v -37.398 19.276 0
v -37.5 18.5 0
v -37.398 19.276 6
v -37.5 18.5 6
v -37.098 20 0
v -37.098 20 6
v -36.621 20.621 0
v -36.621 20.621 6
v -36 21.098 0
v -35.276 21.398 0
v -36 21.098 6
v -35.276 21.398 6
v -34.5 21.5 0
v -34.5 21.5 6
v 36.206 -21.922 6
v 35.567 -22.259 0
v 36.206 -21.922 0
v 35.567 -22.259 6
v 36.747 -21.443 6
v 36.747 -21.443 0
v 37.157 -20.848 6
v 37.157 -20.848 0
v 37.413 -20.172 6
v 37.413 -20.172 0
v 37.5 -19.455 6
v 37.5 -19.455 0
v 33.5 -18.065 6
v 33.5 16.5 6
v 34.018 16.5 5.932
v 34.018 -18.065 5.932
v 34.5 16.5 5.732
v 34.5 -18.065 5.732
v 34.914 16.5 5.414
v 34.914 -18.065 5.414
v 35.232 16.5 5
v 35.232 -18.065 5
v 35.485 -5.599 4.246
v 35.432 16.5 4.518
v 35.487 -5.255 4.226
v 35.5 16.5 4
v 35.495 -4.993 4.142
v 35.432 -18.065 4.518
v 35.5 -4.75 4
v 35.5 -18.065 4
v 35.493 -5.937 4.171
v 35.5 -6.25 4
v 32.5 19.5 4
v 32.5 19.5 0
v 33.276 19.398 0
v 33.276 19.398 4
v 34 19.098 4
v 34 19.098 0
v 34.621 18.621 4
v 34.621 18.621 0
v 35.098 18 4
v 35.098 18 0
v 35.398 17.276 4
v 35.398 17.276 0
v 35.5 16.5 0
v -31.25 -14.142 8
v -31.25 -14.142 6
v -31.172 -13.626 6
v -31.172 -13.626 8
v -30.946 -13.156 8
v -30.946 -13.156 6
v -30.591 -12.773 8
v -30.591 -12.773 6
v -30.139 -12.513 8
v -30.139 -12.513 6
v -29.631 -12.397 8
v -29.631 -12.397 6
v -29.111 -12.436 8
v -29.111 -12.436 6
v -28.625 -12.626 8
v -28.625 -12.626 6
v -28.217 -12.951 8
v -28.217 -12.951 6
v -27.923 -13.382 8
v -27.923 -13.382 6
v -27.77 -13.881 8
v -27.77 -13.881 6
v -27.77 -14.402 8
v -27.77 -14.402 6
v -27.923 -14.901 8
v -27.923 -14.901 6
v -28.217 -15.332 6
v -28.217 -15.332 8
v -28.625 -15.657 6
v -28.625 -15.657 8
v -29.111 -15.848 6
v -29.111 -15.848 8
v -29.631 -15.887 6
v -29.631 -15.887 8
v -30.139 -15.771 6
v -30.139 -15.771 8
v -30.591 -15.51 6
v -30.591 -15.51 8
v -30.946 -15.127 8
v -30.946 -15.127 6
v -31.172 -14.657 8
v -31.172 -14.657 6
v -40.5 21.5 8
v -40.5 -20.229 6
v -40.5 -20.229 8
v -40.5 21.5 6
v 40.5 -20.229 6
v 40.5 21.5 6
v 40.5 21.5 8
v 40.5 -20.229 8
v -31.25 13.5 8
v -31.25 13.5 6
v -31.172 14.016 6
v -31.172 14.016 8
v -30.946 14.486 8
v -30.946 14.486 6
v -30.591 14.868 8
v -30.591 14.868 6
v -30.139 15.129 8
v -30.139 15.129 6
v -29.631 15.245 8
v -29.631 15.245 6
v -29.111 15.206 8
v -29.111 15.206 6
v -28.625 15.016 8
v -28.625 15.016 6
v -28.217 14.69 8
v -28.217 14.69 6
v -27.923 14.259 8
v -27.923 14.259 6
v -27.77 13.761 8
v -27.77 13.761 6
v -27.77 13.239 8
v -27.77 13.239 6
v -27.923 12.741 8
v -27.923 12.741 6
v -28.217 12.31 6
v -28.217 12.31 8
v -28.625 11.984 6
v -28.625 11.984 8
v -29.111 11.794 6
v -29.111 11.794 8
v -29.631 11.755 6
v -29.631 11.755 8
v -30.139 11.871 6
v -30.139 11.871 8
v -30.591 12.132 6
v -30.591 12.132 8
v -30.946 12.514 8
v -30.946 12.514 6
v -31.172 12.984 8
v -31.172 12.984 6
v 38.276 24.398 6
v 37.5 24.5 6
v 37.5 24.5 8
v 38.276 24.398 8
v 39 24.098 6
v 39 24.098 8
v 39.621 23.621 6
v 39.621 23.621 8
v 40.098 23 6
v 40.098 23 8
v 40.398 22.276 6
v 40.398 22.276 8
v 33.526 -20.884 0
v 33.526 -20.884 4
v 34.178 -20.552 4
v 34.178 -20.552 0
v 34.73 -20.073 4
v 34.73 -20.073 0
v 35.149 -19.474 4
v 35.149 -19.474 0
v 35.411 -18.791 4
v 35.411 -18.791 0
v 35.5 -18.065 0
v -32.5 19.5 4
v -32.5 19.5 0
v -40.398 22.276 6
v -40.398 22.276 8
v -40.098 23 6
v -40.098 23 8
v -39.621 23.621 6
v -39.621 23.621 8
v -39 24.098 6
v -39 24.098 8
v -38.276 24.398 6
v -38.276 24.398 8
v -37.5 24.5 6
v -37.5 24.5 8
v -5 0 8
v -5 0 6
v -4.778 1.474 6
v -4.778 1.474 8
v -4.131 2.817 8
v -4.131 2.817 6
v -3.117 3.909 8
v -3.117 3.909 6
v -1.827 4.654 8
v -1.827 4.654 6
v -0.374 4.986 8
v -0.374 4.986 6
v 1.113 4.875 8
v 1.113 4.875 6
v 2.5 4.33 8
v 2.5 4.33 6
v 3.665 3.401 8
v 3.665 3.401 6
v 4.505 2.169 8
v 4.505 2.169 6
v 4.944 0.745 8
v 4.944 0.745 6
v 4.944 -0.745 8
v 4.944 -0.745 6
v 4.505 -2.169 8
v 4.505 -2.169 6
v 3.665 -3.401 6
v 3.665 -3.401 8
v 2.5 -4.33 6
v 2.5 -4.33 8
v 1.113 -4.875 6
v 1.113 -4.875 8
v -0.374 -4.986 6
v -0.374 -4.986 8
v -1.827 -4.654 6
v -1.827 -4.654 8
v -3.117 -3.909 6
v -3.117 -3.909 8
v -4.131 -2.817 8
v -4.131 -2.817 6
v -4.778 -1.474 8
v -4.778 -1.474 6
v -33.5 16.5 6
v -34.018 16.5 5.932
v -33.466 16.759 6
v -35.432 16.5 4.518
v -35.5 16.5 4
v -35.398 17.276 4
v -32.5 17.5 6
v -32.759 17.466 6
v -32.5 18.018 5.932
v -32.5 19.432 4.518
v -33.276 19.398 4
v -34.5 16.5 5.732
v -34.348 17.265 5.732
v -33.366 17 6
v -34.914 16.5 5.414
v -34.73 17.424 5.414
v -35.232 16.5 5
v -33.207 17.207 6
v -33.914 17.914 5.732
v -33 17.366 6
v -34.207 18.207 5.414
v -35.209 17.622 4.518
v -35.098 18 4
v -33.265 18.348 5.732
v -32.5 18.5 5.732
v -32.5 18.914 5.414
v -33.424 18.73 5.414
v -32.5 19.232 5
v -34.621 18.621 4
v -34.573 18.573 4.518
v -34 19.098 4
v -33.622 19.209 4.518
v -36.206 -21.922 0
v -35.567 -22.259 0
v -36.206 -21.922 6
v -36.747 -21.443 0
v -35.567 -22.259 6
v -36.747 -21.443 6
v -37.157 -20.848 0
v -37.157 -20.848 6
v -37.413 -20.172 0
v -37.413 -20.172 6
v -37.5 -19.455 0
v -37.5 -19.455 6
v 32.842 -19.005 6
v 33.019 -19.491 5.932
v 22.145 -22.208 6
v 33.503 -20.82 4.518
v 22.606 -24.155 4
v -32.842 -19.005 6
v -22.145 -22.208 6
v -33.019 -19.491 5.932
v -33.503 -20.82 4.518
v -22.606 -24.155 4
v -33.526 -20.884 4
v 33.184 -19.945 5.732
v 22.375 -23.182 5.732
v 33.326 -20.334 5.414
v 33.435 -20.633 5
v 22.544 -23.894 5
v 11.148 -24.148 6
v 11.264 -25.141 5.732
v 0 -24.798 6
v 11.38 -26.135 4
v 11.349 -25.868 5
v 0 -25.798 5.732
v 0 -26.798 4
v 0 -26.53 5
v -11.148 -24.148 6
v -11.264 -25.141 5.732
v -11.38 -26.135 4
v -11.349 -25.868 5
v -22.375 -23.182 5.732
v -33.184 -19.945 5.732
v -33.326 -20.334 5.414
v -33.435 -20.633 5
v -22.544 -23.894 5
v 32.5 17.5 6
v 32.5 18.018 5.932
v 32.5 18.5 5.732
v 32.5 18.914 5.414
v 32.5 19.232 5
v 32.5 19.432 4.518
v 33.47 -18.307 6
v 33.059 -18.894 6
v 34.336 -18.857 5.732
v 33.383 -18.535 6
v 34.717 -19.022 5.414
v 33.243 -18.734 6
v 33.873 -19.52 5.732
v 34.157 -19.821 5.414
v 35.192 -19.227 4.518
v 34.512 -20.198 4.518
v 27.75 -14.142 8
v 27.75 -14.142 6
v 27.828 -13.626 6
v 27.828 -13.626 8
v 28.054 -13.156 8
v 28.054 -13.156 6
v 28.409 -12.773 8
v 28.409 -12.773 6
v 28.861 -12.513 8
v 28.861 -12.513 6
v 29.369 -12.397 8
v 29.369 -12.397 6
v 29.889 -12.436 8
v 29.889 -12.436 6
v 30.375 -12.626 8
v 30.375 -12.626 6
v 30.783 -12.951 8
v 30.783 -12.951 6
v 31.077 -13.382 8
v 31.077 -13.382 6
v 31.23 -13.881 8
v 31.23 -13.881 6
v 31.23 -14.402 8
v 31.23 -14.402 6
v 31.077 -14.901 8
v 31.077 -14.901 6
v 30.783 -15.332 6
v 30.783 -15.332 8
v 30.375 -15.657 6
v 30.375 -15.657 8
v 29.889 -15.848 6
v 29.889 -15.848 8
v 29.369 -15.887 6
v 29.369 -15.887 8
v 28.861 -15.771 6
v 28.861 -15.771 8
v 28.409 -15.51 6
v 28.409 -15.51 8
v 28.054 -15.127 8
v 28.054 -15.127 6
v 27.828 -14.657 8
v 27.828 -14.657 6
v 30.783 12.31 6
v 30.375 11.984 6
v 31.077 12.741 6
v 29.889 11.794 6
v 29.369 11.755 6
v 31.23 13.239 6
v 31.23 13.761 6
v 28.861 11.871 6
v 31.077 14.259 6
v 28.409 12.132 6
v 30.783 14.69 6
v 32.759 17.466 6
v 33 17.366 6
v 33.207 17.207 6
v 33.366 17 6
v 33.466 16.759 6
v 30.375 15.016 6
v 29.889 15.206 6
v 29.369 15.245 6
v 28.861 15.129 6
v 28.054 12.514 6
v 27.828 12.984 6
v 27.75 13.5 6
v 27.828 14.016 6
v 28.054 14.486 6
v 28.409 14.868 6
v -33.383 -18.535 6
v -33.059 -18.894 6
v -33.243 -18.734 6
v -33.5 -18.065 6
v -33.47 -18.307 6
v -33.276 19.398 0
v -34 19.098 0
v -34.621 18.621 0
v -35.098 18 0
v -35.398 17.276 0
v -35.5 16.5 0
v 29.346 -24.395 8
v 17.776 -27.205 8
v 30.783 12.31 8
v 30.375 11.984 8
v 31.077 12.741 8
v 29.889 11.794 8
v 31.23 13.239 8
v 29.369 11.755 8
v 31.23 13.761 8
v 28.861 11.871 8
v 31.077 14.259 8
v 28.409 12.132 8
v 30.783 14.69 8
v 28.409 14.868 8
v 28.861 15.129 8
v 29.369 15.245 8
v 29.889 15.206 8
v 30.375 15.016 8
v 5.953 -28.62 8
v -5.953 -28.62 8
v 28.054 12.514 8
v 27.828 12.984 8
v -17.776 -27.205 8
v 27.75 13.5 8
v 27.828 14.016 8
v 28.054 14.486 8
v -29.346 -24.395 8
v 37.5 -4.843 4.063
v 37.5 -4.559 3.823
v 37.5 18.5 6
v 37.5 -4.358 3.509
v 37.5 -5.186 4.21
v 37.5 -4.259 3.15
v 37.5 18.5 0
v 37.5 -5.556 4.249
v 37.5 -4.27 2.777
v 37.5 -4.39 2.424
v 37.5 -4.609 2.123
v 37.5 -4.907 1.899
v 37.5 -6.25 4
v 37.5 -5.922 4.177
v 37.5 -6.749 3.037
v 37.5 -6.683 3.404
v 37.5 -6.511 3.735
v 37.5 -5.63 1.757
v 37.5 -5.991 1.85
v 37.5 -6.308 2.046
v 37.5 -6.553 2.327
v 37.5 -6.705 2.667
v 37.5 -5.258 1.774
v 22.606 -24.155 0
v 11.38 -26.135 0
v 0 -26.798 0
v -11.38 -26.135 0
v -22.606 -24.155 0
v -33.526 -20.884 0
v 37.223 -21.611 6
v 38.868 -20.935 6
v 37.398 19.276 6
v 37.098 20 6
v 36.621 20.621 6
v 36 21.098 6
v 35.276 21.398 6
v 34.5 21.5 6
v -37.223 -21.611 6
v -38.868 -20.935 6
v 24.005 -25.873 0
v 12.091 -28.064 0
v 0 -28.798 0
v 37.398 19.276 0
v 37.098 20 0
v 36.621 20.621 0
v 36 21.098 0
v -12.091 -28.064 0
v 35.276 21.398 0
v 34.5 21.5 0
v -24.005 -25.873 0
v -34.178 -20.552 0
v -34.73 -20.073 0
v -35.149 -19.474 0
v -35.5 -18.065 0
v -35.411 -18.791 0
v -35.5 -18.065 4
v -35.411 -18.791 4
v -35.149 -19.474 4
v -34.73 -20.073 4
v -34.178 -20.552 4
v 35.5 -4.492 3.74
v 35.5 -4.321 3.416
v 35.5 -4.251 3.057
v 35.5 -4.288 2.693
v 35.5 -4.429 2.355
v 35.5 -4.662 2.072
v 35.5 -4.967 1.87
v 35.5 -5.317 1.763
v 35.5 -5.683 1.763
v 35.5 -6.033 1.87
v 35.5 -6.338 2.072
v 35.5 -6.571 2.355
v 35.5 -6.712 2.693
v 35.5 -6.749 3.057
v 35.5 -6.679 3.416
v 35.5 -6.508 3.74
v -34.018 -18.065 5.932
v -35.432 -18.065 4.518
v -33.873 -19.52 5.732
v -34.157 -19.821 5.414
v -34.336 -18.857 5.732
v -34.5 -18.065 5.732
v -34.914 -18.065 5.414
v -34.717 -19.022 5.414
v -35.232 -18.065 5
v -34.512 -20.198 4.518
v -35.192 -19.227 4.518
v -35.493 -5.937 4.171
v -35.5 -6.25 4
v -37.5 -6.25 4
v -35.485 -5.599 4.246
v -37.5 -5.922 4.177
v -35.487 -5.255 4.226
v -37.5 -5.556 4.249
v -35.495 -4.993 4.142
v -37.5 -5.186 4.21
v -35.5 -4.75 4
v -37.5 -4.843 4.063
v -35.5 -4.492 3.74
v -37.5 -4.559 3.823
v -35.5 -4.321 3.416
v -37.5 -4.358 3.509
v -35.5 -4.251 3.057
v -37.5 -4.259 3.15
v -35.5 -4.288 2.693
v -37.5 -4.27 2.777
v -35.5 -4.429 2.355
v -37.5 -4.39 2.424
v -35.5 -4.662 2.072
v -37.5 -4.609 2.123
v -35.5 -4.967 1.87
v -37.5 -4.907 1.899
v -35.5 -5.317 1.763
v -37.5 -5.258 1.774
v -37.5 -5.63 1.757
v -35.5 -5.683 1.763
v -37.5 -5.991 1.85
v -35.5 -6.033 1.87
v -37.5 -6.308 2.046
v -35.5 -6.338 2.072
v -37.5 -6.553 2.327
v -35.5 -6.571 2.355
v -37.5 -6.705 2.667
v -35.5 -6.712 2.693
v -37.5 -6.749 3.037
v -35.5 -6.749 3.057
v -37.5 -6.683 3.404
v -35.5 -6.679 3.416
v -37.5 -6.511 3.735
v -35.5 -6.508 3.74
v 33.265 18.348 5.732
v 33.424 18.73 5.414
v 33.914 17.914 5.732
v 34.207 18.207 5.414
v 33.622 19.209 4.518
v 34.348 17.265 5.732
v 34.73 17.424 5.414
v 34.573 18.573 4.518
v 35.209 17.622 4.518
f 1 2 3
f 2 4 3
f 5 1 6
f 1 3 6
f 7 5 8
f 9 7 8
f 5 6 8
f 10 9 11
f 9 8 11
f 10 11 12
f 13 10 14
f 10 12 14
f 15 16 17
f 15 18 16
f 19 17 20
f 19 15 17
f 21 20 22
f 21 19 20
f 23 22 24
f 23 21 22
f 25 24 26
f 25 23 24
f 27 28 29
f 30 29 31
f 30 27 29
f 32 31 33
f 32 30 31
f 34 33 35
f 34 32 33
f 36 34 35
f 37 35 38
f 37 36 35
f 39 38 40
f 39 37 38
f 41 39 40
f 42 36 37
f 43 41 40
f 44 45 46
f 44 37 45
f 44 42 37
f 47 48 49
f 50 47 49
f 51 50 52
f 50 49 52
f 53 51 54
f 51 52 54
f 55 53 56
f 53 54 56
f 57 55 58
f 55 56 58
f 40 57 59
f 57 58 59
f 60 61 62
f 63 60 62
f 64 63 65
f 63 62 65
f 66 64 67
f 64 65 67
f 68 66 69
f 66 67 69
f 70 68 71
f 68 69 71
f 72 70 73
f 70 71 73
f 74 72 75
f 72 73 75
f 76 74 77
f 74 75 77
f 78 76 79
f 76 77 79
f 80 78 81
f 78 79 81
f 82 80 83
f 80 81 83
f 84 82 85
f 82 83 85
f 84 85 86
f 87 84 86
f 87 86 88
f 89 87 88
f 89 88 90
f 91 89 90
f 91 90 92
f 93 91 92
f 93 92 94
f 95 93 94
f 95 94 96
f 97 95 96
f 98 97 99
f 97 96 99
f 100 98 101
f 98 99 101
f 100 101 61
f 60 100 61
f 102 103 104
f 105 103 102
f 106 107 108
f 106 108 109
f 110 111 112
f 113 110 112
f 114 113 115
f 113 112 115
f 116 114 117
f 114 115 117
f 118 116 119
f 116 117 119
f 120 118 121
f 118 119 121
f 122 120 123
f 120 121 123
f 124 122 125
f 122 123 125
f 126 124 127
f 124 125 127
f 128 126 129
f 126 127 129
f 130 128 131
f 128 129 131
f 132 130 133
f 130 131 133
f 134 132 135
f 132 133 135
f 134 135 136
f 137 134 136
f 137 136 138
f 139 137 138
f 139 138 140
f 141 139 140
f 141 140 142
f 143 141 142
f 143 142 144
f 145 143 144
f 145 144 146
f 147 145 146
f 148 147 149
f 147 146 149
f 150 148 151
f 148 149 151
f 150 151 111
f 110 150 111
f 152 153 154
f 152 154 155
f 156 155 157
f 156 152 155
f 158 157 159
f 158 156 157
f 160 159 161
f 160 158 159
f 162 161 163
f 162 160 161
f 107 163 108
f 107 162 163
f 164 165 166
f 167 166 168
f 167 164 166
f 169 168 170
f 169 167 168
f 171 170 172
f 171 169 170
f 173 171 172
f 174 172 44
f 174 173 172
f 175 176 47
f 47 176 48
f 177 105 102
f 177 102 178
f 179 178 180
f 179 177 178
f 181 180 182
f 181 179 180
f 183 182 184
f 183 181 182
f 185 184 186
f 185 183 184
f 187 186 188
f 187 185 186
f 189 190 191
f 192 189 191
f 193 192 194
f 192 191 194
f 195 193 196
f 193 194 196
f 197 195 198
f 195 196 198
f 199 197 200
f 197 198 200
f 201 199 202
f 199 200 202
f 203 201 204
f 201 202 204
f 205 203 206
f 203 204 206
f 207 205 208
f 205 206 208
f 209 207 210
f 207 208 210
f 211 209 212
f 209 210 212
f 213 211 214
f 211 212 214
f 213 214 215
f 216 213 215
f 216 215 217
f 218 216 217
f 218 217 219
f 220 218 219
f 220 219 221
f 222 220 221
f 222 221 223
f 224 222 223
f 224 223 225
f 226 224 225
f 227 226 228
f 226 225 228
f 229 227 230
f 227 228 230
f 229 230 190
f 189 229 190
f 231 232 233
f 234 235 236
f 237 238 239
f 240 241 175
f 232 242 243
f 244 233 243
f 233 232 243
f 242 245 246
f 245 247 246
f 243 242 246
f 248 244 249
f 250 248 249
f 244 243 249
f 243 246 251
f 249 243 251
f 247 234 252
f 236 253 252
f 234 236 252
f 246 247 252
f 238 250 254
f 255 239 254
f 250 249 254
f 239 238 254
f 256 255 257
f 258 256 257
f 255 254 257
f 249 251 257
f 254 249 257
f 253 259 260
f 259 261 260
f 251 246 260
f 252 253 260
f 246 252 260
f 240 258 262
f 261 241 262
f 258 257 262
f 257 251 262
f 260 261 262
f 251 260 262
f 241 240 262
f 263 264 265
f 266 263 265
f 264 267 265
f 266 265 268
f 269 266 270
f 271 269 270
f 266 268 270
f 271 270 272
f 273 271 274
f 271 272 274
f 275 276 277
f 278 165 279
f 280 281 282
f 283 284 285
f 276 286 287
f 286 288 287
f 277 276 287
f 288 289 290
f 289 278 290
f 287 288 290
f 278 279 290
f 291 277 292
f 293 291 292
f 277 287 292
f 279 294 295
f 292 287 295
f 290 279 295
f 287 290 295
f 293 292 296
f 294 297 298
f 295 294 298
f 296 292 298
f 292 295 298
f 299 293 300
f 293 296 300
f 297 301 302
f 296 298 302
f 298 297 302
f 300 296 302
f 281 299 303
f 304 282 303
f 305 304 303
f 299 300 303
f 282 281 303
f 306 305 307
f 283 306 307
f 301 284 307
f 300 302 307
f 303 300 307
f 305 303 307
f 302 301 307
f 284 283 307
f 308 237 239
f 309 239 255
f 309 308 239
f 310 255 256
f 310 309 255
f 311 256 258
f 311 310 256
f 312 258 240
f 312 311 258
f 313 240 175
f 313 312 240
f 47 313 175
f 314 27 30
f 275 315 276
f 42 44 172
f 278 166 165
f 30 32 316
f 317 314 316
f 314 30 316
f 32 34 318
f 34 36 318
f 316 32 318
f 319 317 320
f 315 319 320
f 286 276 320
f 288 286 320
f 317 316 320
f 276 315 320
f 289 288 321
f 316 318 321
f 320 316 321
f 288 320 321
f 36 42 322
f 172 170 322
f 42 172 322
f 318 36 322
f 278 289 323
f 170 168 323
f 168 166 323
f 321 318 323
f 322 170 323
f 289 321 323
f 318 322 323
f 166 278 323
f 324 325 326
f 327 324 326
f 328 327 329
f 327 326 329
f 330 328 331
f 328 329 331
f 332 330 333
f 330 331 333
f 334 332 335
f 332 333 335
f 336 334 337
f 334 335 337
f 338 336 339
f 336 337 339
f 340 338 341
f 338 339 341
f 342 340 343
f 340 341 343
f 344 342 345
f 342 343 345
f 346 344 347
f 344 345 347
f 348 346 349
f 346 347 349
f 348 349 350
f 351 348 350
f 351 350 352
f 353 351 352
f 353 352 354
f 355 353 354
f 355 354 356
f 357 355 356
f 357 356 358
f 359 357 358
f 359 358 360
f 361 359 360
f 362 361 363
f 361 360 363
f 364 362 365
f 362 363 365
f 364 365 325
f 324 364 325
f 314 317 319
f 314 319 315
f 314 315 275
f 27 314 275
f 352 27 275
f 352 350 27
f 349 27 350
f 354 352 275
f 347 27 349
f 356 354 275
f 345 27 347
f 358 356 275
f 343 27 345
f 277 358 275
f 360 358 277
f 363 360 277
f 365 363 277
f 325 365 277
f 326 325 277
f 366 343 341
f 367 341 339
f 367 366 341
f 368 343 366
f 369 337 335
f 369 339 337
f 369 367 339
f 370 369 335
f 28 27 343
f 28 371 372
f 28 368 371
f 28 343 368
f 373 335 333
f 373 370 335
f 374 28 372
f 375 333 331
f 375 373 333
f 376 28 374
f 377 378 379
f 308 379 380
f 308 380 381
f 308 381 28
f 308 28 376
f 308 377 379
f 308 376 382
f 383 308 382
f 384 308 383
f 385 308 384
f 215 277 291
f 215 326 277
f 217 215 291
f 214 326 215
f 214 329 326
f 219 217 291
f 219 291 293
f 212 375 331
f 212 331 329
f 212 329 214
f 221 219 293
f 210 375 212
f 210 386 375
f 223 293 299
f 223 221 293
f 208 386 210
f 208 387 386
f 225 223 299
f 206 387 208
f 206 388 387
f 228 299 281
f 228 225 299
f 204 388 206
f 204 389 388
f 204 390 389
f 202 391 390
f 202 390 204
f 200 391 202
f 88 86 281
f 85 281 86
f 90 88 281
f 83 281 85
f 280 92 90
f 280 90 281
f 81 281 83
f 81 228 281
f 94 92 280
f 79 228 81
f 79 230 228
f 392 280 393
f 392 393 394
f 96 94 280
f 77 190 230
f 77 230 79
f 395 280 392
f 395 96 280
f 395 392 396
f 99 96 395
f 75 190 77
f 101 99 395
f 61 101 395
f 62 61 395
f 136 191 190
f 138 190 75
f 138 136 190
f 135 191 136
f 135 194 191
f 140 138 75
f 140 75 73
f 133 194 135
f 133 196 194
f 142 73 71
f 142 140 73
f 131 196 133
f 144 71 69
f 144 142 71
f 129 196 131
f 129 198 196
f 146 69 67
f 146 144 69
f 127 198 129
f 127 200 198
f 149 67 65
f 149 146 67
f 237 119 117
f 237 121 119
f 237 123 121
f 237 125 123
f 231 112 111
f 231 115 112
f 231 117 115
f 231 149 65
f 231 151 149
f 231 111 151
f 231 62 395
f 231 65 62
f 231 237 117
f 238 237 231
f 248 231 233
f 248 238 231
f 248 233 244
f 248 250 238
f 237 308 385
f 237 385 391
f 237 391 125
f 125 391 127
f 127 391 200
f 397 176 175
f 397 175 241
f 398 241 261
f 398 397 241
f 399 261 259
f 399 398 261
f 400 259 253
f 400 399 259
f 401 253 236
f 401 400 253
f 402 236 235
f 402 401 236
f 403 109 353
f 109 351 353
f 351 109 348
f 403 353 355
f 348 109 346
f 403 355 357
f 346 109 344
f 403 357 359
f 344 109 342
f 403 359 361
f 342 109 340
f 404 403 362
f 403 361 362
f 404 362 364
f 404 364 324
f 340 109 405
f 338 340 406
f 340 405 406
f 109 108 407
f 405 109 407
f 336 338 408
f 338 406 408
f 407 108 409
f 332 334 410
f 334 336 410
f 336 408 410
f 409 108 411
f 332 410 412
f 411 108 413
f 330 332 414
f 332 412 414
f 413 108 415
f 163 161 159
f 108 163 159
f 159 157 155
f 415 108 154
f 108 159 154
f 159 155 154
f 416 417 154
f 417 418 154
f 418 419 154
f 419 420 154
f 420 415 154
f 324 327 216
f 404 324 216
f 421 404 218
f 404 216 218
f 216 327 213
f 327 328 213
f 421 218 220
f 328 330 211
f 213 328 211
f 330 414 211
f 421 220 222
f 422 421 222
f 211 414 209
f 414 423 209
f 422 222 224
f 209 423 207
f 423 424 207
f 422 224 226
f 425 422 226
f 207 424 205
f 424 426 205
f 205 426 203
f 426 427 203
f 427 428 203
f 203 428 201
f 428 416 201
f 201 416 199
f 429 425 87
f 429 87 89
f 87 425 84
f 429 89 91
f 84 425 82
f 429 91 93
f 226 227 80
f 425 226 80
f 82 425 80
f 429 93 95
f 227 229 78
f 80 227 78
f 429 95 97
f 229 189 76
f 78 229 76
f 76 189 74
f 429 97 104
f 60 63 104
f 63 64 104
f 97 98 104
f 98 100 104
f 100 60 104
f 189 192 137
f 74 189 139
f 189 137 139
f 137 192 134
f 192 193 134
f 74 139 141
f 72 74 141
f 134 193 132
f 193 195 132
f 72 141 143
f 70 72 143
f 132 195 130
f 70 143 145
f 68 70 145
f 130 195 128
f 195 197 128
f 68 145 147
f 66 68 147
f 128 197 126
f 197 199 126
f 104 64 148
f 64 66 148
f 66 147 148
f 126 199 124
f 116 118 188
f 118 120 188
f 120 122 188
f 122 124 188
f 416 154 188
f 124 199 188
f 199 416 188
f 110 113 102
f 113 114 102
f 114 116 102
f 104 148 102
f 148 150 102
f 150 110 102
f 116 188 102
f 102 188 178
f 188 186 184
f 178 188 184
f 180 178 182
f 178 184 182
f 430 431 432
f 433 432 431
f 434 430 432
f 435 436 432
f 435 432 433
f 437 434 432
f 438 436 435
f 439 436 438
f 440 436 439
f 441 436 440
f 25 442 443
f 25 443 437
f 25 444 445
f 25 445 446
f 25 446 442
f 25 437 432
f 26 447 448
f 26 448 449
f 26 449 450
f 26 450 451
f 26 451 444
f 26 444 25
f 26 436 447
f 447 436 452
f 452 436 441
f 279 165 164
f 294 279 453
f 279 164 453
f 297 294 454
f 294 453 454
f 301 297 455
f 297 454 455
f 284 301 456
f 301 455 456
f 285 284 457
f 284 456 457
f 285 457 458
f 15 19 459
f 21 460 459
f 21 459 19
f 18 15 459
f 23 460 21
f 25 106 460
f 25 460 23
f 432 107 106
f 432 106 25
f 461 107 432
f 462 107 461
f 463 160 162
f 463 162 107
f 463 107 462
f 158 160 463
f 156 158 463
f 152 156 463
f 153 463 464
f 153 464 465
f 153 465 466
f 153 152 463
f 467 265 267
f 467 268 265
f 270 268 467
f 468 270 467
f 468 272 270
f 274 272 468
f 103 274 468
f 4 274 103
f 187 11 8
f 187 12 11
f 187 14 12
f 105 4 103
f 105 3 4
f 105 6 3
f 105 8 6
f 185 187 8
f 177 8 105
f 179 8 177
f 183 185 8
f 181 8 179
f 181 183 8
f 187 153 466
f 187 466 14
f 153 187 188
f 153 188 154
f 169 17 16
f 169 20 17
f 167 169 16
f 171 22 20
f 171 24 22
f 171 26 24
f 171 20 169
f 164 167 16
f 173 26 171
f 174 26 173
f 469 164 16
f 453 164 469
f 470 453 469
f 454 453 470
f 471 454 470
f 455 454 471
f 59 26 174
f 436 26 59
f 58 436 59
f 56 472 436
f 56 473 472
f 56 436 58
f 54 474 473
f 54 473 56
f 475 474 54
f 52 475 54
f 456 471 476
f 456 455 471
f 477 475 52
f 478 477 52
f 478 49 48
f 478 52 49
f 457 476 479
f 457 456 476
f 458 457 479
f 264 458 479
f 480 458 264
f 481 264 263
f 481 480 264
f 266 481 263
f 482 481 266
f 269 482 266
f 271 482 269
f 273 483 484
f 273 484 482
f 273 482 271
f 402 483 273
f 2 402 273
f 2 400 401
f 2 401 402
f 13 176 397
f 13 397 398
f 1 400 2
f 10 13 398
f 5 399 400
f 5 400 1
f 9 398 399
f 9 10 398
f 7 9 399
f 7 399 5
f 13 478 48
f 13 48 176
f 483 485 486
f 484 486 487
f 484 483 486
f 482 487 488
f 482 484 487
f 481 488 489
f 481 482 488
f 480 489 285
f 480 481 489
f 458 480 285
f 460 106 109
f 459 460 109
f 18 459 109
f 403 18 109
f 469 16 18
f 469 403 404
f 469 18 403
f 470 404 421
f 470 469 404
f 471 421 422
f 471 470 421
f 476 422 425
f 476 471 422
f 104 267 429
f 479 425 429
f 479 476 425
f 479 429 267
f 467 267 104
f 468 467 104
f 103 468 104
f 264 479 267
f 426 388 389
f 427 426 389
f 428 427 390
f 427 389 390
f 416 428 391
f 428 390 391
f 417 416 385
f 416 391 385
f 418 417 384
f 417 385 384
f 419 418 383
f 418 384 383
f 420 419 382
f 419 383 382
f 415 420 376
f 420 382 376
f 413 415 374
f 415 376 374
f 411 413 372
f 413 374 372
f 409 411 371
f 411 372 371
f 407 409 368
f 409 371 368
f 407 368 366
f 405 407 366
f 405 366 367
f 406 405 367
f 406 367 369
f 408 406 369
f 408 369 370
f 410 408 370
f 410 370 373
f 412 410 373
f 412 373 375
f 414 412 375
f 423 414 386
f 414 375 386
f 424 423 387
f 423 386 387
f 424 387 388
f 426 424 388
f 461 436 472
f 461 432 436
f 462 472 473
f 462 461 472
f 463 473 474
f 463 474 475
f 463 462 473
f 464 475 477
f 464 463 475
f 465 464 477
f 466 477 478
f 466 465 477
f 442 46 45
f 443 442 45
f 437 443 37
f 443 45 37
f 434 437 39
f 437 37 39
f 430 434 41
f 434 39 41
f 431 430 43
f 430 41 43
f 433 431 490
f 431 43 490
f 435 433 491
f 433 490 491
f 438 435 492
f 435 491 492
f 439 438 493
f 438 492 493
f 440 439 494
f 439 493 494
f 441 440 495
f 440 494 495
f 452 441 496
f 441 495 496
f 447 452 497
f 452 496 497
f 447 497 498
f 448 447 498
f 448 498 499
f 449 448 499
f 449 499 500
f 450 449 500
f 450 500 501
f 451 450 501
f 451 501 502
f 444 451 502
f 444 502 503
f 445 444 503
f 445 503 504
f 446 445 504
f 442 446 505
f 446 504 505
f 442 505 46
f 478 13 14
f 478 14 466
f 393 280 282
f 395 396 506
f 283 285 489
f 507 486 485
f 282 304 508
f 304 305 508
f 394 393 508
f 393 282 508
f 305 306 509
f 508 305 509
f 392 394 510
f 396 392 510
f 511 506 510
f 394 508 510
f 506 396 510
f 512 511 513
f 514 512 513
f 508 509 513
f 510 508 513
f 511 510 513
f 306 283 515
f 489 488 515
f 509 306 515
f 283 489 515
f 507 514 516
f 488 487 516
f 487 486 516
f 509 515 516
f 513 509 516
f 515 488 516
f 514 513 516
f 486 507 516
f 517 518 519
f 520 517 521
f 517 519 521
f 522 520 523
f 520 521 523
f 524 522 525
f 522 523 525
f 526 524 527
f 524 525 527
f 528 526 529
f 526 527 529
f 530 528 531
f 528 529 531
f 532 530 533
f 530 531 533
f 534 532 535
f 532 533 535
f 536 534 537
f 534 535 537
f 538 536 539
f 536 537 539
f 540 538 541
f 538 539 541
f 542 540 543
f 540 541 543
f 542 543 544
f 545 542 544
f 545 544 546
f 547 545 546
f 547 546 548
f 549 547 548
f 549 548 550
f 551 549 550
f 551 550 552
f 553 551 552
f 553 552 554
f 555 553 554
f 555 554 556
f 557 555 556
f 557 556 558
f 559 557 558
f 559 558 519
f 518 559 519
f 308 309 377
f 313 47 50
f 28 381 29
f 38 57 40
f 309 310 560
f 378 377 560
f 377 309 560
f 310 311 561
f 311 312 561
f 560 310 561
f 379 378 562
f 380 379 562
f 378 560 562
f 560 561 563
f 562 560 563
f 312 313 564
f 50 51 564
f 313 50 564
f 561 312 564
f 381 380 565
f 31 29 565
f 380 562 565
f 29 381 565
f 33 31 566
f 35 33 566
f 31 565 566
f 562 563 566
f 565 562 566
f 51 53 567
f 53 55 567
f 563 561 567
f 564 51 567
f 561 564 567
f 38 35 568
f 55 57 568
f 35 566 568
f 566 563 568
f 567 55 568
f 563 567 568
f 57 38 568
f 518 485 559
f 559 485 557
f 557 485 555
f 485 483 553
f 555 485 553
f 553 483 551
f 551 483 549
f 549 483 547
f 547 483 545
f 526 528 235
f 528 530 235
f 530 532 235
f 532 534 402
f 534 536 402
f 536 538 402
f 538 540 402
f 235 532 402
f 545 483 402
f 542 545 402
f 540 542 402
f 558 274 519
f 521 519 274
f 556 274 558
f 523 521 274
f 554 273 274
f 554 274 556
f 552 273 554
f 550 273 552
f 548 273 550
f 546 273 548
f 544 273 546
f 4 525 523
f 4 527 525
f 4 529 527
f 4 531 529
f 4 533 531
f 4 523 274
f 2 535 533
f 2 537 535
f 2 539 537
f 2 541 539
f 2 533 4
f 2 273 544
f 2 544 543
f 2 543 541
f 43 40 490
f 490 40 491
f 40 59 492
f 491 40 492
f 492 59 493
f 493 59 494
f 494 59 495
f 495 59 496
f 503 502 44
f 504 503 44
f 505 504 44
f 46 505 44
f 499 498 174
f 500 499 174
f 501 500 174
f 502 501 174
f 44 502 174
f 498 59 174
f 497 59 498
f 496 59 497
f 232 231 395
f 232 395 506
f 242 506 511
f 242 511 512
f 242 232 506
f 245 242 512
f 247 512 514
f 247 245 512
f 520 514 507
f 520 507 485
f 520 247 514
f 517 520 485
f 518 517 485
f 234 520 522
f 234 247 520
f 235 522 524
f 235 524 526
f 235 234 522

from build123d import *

# Parameters (mm, degrees)
DODANIE_WYCI_GNI_CIE1_DEPTH = 6
DODANIE_WYCI_GNI_CIE2_DEPTH = 2
SKORUPA1_T                  = -2
SZKIC3_R                    = 1.7499999999999998
SZKIC3_R_2                  = 1.7500000000000004
SZKIC3_R_3                  = 5
WYTNIJ_WYCI_GNI_CIE1_DEPTH  = 2
ZAOKR_GLENIE1_R             = 3
ZAOKR_GLENIE2_R             = 2
WYTNIJ_WYCI_GNI_CIE2_REACH  = 85.53
SZKIC4_R                    = 1.2500000000000009


with BuildPart() as part:
    # Szkic1 → Dodanie-wyciągnięcie1 (new body)
    with BuildSketch(Plane.XY):
        with BuildLine():
            Line((-37.5, 21.499999999999993), (37.5, 21.499999999999993))
            Line((37.5, 21.499999999999993), (37.5, -21.500000000000004))
            ThreePointArc((37.5, -21.500000000000004), (1.312e-14, -28.797518911304223), (-37.49999999999999, -21.500000000000004))
            Line((-37.49999999999999, -21.500000000000004), (-37.5, 21.499999999999993))
        make_face()
    extrude(amount=DODANIE_WYCI_GNI_CIE1_DEPTH)

    # Szkic2 → Dodanie-wyciągnięcie2 (add)
    with BuildSketch(Plane.XY.offset(6)):
        with BuildLine():
            Line((-40.5, -20.229187385635353), (-40.5, 21.49999999999997))
            ThreePointArc((-40.5, 21.49999999999997), (-39.62132034355964, 23.62132034355963), (-37.49999999999998, 24.49999999999999))
            Line((-37.49999999999998, 24.49999999999999), (37.49999999999998, 24.49999999999999))
            ThreePointArc((37.49999999999998, 24.49999999999999), (39.621320343559645, 23.621320343559635), (40.5, 21.49999999999997))
            Line((40.5, 21.49999999999997), (40.50000000000001, -20.229187385635377))
            ThreePointArc((40.50000000000001, -20.229187385635377), (-9.09e-15, -28.797518911304223), (-40.5, -20.229187385635353))
        make_face()
    extrude(amount=DODANIE_WYCI_GNI_CIE2_DEPTH)

    # Skorupa1
    skorupa1_openings = [part.faces().sort_by_distance(p)[0] for p in [
        (0, -2.499693037, 0),
    ]]
    offset(amount=SKORUPA1_T, openings=skorupa1_openings, kind=Kind.INTERSECTION)

    # Szkic3 → Wytnij-wyciągnięcie1 (cut)
    with BuildSketch(Plane(origin=(0, 0, 6), x_dir=(-1, 0, 0), z_dir=(0, 0, -1))):
        with Locations((-29.5, 13.49999999999999)):
            Circle(SZKIC3_R)
        with Locations((29.5, 13.49999999999999)):
            Circle(SZKIC3_R)
        with Locations((29.5, -14.141648443529768)):
            Circle(SZKIC3_R_2)
        with Locations((-29.5, -14.141648443529768)):
            Circle(SZKIC3_R_2)
        Circle(SZKIC3_R_3)
    extrude(amount=-WYTNIJ_WYCI_GNI_CIE1_DEPTH, mode=Mode.SUBTRACT)

    # Zaokrąglenie1
    zaokr_glenie1_edges = [part.edges().sort_by_distance(p)[0] for p in [
        (-35.5, -20.14164844352976, 3),
        (35.5, -20.14164844352979, 3),
        (35.5, 19.499999999999993, 3),
        (-35.5, 19.499999999999993, 3),
        (-37.499999999999986, -21.5, 3),
        (-37.5, 21.499999999999993, 3),
        (37.5, 21.499999999999993, 3),
        (37.5, -21.499999999999993, 3),
    ]]
    fillet(zaokr_glenie1_edges, radius=ZAOKR_GLENIE1_R)

    # Zaokrąglenie2
    zaokr_glenie2_edges = [part.edges().sort_by_distance(p)[0] for p in [
        (-35.5, -0.7826871340449166, 6),
        (1.421e-14, -26.797518911304223, 6),
        (0, 19.499999999999993, 6),
        (35.5, -0.7826871340449308, 6),
        (-34.621320343559645, 18.621320343559635, 6),
        (34.621320343559645, 18.621320343559635, 6),
        (34.95753406572738, -19.785992272119067, 6),
        (-34.95753406572737, -19.785992272119046, 6),
    ]]
    fillet(zaokr_glenie2_edges, radius=ZAOKR_GLENIE2_R)

    # Wytnij-wyciągnięcie2: up to this face of the body (flat: up to its plane)
    wytnij_wyci_gni_cie2_end = Plane(part.part.faces().sort_by_distance((37.5, -0.477420367, 3))[0])
    # Szkic4 → Wytnij-wyciągnięcie2 (cut, up to the picked face)
    with BuildSketch(Plane.ZY.offset(37.5), mode=Mode.PRIVATE) as wytnij_wyci_gni_cie2_sk1:
        with Locations(Location((2.999999999998171, -5.500000000000033, 0), (0, 0, 323.130102354))):
            Circle(SZKIC4_R)
    wytnij_wyci_gni_cie2_tool1 = split(extrude(wytnij_wyci_gni_cie2_sk1.sketch, amount=-WYTNIJ_WYCI_GNI_CIE2_REACH, mode=Mode.PRIVATE), bisect_by=wytnij_wyci_gni_cie2_end, keep=Keep.BOTH, mode=Mode.PRIVATE)
    add(wytnij_wyci_gni_cie2_tool1.solids().sort_by(Axis((-37.5, -5.5, 3), (1, 1.6e-16, 0)))[0], mode=Mode.SUBTRACT)


solid = part.part
